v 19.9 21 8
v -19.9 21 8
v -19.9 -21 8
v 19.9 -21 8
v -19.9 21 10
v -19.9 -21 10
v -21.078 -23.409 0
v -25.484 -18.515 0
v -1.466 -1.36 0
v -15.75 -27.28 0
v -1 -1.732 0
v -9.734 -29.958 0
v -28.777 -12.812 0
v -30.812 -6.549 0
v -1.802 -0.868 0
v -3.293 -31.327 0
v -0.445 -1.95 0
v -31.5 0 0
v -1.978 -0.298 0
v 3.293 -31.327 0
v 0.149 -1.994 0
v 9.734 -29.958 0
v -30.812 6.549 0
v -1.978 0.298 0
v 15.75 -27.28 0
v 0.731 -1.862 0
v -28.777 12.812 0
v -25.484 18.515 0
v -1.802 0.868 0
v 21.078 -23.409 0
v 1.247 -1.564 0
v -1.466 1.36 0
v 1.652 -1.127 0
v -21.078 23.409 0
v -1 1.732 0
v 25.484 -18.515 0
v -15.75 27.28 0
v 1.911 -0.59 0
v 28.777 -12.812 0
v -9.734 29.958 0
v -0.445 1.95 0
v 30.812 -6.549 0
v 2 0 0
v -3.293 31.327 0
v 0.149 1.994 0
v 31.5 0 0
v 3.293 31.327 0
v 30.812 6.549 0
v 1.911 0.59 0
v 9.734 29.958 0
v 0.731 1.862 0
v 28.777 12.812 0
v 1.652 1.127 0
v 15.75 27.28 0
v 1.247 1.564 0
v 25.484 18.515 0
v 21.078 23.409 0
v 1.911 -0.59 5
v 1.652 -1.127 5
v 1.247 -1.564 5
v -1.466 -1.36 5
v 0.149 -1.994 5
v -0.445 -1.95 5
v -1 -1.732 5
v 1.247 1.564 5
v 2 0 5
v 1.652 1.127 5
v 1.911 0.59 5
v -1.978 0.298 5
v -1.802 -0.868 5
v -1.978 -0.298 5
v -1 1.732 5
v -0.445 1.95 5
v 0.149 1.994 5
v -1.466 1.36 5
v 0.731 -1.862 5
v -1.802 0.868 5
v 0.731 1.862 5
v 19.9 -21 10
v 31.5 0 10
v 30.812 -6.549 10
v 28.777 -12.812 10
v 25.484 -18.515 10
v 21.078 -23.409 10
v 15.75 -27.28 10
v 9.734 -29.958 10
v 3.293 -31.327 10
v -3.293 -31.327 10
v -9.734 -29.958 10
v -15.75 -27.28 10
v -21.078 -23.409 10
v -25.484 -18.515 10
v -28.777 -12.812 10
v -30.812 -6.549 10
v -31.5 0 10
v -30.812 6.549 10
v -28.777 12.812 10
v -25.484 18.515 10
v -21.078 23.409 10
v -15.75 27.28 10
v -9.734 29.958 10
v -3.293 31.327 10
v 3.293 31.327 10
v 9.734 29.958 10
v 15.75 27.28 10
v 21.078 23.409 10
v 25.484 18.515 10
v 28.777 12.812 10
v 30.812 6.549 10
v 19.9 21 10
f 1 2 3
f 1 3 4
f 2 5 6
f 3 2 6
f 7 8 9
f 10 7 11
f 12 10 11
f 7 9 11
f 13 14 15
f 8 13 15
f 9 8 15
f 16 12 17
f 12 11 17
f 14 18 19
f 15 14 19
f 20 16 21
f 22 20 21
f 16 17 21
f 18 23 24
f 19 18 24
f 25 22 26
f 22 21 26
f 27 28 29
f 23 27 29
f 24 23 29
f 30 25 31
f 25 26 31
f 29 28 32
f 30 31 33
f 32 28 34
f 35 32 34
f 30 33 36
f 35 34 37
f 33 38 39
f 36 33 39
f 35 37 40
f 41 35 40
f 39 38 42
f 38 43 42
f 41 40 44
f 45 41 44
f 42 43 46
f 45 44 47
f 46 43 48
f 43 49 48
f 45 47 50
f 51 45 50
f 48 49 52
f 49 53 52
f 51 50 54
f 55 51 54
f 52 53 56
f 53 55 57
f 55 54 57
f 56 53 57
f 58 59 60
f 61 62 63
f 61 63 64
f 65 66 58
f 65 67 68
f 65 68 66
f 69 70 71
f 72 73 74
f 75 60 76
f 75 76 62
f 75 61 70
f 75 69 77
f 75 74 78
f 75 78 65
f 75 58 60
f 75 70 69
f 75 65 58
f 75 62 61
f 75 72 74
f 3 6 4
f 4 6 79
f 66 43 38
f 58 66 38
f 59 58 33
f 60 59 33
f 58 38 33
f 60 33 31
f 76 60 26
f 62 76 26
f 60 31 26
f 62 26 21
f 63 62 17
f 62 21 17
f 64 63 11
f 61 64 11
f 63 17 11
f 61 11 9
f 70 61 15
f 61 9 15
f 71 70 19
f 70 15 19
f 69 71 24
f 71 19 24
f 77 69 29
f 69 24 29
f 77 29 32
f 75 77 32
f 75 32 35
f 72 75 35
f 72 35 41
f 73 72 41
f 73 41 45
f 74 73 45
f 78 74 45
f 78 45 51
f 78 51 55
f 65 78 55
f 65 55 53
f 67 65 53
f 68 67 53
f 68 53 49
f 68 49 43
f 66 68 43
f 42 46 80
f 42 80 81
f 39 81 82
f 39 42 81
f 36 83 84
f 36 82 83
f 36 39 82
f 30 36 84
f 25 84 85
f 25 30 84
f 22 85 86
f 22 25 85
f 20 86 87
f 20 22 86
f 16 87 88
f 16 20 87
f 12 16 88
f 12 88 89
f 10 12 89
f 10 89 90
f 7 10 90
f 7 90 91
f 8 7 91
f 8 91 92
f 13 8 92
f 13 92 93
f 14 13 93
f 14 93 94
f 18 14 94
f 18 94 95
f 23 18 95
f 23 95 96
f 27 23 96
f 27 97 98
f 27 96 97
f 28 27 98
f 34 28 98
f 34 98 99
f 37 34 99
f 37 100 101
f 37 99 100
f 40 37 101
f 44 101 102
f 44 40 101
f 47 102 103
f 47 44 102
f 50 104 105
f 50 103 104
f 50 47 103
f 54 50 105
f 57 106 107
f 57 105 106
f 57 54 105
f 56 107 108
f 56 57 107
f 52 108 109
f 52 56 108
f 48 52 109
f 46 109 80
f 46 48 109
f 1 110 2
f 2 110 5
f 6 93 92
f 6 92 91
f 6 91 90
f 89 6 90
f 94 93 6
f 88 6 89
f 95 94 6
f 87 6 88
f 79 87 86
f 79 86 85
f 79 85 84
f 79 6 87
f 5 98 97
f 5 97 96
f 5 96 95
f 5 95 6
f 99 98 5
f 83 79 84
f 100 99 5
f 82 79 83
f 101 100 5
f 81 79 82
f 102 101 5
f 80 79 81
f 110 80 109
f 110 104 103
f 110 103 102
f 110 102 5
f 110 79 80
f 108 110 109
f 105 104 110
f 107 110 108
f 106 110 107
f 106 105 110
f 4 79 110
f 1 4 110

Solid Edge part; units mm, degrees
sketch "Sketch1" plane through (0, 0, 0) normal (0, 0, 1) x (1, 0, 0)
  circle A0 centre (0, 0) radius 31.5
extrude "Protrusion1" add sketch "Sketch1" along normal blind 10
sketch "Sketch2" plane through (0, 0, 0) normal (0, 0, -1) x (1, 0, 0)
  circle A0 centre (0, 0) radius 2
  dimension "D1" = 4
extrude "Extrusionsausschnitt_1" cut sketch "Sketch2" against normal blind 5
sketch "Sketch3" plane through (0, 0, 10) normal (0, 0, 1) x (0, 1, 0)
  line L0 (-21, -19.9) -> (21, -19.9)
  line L1 (21, -19.9) -> (21, 19.9)
  line L2 (21, 19.9) -> (-21, 19.9)
  line L3 (-21, 19.9) -> (-21, -19.9)
extrude "Extrusionsausschnitt_2" cut sketch "Sketch3" against normal blind 2
properties material "Nylon, allgemein"
